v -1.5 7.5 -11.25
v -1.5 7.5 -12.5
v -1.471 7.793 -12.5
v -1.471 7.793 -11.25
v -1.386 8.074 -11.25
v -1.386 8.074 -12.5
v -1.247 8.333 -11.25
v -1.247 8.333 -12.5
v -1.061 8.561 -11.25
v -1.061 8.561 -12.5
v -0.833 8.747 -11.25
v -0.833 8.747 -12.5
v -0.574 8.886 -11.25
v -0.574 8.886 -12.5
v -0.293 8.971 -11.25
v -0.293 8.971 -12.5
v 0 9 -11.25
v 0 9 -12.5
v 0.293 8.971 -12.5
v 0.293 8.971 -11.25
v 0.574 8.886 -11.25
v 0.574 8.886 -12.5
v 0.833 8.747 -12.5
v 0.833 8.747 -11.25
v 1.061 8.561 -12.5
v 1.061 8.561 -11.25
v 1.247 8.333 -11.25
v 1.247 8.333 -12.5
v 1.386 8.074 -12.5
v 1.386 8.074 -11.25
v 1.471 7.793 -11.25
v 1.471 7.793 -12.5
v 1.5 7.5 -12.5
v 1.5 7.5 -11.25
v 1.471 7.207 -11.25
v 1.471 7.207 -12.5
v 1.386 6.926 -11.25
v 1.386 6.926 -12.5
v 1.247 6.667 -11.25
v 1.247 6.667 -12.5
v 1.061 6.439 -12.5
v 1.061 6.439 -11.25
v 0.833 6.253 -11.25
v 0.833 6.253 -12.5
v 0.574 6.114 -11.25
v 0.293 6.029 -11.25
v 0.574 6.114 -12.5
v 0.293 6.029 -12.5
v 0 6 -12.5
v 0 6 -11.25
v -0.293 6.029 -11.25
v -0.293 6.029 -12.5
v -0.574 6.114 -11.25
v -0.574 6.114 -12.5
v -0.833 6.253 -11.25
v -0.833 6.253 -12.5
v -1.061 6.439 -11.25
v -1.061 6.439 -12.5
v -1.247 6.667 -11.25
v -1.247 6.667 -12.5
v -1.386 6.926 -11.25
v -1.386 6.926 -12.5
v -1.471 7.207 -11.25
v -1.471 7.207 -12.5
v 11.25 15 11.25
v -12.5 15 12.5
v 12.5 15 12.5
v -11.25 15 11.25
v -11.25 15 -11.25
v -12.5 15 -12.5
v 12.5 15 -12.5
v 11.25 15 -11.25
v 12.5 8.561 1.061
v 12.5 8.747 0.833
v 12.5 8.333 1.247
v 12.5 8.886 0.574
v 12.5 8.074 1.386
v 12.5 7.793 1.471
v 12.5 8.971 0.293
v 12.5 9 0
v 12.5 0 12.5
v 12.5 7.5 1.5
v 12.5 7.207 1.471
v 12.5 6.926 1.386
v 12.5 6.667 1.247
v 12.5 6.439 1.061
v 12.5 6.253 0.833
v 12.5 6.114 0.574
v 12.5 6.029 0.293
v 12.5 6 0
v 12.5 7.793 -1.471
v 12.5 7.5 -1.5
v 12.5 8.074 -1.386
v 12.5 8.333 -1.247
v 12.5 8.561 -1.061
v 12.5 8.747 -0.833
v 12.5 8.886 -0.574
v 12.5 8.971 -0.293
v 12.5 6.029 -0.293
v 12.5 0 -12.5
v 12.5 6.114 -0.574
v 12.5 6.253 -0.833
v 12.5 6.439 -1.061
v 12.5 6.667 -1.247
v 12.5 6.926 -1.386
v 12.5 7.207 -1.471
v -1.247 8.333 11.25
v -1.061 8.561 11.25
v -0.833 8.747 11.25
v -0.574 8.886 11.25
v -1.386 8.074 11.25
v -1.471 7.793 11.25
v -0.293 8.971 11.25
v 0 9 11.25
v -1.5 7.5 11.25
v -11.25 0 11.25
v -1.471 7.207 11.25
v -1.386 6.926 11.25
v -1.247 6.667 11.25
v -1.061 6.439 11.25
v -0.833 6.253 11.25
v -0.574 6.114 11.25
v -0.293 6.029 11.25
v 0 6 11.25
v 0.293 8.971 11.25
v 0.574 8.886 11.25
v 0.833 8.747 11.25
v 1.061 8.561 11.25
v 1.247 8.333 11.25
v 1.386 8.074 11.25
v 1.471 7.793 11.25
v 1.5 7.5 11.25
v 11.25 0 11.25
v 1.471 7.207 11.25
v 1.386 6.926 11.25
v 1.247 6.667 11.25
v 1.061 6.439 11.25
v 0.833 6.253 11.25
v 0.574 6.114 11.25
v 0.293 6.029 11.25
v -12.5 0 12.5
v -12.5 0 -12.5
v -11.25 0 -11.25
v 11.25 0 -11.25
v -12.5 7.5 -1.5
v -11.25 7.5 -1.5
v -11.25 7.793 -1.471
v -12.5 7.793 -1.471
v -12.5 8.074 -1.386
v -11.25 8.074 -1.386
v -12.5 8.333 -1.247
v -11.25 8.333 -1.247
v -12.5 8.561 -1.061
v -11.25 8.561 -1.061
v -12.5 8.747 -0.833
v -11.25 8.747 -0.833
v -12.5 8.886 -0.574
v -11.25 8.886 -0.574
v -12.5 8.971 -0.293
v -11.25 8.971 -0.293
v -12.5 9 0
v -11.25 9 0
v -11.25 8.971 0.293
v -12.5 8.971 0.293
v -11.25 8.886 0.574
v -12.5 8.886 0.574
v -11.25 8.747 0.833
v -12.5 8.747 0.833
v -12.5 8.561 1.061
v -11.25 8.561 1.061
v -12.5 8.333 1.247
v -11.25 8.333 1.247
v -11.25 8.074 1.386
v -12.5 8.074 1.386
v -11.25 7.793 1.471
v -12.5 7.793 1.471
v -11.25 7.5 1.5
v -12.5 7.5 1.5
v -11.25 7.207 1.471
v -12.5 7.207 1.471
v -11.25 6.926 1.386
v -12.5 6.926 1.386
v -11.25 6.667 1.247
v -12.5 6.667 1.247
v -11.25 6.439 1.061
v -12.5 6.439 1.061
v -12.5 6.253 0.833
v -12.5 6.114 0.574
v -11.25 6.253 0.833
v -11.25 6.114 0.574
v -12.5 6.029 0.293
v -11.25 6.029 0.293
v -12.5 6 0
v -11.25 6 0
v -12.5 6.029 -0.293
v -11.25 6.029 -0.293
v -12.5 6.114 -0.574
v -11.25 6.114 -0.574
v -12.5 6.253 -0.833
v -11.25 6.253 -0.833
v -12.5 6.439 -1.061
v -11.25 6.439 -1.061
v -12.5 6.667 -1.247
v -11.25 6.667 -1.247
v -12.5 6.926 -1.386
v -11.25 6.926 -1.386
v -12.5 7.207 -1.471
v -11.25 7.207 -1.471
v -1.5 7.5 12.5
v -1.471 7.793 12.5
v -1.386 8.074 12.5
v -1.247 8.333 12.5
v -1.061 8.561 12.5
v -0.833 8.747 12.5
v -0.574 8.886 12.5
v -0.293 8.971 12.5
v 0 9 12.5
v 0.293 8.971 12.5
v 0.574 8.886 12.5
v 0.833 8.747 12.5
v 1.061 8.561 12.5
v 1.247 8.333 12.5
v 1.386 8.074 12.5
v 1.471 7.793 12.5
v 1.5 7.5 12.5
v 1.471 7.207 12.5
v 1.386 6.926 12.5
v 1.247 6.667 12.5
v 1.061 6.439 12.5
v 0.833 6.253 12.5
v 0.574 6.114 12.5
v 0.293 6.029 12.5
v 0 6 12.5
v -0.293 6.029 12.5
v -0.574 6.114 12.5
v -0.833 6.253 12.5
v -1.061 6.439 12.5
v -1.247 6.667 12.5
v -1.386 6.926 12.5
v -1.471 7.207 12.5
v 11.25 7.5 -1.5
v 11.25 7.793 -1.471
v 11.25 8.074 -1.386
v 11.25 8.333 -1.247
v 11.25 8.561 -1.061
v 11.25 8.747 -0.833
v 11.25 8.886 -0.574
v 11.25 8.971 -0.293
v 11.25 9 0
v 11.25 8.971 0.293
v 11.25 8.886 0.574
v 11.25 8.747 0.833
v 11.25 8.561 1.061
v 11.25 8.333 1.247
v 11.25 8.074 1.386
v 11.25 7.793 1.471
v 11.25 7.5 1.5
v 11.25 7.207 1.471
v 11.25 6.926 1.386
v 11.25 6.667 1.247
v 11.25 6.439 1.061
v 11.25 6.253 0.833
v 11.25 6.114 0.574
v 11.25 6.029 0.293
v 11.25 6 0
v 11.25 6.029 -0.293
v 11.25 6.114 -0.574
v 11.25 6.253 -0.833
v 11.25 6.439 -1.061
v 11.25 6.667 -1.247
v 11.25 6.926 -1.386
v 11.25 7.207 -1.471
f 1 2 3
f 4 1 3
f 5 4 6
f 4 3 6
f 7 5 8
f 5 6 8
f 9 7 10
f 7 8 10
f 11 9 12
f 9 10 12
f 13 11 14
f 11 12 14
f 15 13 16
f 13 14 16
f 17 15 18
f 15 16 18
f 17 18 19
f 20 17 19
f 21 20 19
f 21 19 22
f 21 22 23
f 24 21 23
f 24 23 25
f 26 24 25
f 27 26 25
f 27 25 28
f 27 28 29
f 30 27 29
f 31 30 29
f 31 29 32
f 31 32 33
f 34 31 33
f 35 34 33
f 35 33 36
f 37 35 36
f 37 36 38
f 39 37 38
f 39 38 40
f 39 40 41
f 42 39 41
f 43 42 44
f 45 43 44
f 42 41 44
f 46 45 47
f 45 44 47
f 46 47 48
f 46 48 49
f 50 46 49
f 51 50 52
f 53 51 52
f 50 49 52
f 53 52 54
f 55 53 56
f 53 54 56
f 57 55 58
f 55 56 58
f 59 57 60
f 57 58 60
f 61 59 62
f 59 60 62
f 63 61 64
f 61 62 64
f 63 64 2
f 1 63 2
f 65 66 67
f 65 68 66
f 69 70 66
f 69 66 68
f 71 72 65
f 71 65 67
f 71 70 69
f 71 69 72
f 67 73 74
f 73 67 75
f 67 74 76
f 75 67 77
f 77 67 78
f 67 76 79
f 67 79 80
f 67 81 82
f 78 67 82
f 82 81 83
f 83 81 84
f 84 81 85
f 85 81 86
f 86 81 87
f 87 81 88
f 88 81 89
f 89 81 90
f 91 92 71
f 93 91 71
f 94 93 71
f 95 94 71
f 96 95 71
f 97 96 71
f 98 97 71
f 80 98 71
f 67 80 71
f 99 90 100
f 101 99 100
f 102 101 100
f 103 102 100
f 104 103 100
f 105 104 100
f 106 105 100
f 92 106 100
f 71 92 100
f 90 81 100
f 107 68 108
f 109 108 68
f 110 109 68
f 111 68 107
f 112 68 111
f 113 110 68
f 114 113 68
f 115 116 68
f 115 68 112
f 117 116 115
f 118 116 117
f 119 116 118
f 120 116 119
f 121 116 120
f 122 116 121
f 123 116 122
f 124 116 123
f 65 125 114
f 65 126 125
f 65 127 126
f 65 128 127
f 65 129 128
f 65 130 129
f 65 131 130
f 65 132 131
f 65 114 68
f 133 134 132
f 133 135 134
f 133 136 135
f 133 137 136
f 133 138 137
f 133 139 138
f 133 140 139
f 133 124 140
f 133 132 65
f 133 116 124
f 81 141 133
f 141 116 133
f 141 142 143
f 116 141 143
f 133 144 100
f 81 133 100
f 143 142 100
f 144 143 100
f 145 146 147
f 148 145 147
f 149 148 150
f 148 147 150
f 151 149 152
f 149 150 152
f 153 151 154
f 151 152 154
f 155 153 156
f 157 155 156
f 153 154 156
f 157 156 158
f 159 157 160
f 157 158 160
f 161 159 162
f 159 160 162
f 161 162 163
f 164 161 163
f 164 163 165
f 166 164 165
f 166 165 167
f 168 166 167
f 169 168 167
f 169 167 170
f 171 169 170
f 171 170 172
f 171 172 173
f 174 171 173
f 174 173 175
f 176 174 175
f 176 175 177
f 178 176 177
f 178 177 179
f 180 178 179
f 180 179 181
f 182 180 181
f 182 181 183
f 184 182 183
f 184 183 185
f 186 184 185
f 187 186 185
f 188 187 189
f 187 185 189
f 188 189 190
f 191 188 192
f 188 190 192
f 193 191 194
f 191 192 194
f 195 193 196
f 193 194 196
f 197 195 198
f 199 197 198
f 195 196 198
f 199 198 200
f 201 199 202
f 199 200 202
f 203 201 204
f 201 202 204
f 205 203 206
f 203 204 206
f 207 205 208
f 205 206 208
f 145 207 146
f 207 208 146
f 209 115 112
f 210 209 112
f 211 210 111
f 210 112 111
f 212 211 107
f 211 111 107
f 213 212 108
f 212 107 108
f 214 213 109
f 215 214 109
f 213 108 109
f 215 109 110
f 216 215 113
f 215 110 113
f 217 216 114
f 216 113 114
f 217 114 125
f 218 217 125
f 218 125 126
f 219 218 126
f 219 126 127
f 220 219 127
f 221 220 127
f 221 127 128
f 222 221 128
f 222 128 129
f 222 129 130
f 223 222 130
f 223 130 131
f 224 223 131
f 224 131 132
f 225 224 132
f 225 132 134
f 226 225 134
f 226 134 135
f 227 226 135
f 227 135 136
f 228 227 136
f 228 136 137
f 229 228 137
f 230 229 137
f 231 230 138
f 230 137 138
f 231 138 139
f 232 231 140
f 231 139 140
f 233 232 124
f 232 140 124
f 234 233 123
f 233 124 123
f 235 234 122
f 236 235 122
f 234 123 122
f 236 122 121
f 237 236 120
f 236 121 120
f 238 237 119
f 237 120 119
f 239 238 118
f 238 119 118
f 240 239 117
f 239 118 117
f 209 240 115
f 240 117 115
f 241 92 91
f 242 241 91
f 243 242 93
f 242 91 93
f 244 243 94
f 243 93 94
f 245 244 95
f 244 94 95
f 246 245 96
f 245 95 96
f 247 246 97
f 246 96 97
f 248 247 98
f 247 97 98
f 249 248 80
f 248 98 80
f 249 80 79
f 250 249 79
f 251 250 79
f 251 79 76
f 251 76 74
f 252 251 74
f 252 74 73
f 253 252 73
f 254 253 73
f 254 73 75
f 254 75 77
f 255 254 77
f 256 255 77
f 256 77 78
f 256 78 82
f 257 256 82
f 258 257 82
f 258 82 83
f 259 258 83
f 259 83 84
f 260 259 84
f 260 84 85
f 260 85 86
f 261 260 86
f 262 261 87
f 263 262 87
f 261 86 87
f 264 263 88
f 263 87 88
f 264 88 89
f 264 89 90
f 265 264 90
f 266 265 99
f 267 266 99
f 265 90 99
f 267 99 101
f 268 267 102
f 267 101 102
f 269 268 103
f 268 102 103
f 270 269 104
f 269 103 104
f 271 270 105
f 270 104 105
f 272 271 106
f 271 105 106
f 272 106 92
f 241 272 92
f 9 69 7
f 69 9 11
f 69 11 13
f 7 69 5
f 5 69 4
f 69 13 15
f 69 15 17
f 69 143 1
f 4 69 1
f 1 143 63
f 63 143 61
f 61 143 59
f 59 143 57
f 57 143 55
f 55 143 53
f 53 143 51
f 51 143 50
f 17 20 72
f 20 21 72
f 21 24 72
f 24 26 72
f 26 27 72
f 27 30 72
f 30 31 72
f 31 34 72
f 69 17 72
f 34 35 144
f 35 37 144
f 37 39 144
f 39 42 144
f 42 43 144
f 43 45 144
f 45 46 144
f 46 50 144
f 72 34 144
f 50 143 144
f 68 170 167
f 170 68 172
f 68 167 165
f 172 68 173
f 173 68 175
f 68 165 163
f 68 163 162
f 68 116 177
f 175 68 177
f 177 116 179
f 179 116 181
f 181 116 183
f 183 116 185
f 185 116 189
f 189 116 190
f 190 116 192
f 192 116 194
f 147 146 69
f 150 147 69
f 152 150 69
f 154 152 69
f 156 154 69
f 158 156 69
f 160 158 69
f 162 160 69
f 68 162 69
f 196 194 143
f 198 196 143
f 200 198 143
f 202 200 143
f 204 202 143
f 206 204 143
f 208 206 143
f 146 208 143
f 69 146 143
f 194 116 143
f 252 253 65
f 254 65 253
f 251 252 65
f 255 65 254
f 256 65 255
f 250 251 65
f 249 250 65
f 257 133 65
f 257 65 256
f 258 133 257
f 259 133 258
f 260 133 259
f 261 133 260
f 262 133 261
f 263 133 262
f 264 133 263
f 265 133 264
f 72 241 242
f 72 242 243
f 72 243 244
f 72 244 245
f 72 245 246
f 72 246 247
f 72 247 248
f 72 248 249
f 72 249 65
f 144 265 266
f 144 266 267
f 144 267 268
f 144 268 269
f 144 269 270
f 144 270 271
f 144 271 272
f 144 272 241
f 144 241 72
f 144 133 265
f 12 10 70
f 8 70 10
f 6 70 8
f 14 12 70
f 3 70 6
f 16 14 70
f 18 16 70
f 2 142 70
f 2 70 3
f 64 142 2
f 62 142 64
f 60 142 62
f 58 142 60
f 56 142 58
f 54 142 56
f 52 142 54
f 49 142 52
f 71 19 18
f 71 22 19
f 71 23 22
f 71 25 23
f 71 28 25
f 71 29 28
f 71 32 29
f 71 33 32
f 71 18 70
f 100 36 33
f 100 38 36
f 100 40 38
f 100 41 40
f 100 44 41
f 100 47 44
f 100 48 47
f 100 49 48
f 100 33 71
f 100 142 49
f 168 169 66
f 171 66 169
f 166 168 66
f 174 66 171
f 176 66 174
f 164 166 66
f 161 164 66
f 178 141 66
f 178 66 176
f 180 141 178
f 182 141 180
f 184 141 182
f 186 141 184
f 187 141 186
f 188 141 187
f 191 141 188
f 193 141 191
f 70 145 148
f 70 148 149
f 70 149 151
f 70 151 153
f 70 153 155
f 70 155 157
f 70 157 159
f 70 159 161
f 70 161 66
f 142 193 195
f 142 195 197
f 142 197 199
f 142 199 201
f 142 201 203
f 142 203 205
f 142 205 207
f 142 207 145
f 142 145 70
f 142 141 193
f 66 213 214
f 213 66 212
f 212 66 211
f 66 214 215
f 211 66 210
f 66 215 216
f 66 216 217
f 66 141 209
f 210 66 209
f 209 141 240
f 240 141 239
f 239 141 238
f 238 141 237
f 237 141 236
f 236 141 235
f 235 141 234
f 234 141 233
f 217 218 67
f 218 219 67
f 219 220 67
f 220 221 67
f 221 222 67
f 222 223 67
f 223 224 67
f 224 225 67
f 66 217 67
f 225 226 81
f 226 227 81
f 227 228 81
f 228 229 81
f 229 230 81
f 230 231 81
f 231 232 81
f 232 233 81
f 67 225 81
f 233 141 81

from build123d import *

# Parameters (mm, degrees)
SKETCH1_W           = 25
SKETCH1_H           = 25
SKETCH1_W_2         = 22.500853306
SKETCH1_H_2         = 22.500853306
BOSS_EXTRUDE1_DEPTH = 15
SKETCH2_R           = 1.5
CUT_EXTRUDE1_DEPTH  = 32.721443851
SKETCH3_R           = 1.5
CUT_EXTRUDE2_DEPTH  = 32.721443851


with BuildPart() as part:
    # Sketch1 → Boss-Extrude1 (new body)
    with BuildSketch(Plane(origin=(0, 0, 0), x_dir=(1, 0, 0), z_dir=(0, 1, 0))):
        Rectangle(SKETCH1_W, SKETCH1_H)
        Rectangle(SKETCH1_W_2, SKETCH1_H_2, mode=Mode.SUBTRACT)
    extrude(amount=BOSS_EXTRUDE1_DEPTH)

    # Sketch2 → Cut-Extrude1 (cut, through all)
    with BuildSketch(Plane(origin=(0, 0, -12.5), x_dir=(-1, 0, 0), z_dir=(0, 0, -1))):
        with Locations((0, 7.5)):
            Circle(SKETCH2_R)
    extrude(amount=-CUT_EXTRUDE1_DEPTH, mode=Mode.SUBTRACT)

    # Sketch3 → Cut-Extrude2 (cut, through all)
    with BuildSketch(Plane(origin=(12.5, 0, 0), x_dir=(0, 0, -1), z_dir=(1, 0, 0))):
        with Locations((0, 7.5)):
            Circle(SKETCH3_R)
    extrude(amount=-CUT_EXTRUDE2_DEPTH, mode=Mode.SUBTRACT)


solid = part.part
